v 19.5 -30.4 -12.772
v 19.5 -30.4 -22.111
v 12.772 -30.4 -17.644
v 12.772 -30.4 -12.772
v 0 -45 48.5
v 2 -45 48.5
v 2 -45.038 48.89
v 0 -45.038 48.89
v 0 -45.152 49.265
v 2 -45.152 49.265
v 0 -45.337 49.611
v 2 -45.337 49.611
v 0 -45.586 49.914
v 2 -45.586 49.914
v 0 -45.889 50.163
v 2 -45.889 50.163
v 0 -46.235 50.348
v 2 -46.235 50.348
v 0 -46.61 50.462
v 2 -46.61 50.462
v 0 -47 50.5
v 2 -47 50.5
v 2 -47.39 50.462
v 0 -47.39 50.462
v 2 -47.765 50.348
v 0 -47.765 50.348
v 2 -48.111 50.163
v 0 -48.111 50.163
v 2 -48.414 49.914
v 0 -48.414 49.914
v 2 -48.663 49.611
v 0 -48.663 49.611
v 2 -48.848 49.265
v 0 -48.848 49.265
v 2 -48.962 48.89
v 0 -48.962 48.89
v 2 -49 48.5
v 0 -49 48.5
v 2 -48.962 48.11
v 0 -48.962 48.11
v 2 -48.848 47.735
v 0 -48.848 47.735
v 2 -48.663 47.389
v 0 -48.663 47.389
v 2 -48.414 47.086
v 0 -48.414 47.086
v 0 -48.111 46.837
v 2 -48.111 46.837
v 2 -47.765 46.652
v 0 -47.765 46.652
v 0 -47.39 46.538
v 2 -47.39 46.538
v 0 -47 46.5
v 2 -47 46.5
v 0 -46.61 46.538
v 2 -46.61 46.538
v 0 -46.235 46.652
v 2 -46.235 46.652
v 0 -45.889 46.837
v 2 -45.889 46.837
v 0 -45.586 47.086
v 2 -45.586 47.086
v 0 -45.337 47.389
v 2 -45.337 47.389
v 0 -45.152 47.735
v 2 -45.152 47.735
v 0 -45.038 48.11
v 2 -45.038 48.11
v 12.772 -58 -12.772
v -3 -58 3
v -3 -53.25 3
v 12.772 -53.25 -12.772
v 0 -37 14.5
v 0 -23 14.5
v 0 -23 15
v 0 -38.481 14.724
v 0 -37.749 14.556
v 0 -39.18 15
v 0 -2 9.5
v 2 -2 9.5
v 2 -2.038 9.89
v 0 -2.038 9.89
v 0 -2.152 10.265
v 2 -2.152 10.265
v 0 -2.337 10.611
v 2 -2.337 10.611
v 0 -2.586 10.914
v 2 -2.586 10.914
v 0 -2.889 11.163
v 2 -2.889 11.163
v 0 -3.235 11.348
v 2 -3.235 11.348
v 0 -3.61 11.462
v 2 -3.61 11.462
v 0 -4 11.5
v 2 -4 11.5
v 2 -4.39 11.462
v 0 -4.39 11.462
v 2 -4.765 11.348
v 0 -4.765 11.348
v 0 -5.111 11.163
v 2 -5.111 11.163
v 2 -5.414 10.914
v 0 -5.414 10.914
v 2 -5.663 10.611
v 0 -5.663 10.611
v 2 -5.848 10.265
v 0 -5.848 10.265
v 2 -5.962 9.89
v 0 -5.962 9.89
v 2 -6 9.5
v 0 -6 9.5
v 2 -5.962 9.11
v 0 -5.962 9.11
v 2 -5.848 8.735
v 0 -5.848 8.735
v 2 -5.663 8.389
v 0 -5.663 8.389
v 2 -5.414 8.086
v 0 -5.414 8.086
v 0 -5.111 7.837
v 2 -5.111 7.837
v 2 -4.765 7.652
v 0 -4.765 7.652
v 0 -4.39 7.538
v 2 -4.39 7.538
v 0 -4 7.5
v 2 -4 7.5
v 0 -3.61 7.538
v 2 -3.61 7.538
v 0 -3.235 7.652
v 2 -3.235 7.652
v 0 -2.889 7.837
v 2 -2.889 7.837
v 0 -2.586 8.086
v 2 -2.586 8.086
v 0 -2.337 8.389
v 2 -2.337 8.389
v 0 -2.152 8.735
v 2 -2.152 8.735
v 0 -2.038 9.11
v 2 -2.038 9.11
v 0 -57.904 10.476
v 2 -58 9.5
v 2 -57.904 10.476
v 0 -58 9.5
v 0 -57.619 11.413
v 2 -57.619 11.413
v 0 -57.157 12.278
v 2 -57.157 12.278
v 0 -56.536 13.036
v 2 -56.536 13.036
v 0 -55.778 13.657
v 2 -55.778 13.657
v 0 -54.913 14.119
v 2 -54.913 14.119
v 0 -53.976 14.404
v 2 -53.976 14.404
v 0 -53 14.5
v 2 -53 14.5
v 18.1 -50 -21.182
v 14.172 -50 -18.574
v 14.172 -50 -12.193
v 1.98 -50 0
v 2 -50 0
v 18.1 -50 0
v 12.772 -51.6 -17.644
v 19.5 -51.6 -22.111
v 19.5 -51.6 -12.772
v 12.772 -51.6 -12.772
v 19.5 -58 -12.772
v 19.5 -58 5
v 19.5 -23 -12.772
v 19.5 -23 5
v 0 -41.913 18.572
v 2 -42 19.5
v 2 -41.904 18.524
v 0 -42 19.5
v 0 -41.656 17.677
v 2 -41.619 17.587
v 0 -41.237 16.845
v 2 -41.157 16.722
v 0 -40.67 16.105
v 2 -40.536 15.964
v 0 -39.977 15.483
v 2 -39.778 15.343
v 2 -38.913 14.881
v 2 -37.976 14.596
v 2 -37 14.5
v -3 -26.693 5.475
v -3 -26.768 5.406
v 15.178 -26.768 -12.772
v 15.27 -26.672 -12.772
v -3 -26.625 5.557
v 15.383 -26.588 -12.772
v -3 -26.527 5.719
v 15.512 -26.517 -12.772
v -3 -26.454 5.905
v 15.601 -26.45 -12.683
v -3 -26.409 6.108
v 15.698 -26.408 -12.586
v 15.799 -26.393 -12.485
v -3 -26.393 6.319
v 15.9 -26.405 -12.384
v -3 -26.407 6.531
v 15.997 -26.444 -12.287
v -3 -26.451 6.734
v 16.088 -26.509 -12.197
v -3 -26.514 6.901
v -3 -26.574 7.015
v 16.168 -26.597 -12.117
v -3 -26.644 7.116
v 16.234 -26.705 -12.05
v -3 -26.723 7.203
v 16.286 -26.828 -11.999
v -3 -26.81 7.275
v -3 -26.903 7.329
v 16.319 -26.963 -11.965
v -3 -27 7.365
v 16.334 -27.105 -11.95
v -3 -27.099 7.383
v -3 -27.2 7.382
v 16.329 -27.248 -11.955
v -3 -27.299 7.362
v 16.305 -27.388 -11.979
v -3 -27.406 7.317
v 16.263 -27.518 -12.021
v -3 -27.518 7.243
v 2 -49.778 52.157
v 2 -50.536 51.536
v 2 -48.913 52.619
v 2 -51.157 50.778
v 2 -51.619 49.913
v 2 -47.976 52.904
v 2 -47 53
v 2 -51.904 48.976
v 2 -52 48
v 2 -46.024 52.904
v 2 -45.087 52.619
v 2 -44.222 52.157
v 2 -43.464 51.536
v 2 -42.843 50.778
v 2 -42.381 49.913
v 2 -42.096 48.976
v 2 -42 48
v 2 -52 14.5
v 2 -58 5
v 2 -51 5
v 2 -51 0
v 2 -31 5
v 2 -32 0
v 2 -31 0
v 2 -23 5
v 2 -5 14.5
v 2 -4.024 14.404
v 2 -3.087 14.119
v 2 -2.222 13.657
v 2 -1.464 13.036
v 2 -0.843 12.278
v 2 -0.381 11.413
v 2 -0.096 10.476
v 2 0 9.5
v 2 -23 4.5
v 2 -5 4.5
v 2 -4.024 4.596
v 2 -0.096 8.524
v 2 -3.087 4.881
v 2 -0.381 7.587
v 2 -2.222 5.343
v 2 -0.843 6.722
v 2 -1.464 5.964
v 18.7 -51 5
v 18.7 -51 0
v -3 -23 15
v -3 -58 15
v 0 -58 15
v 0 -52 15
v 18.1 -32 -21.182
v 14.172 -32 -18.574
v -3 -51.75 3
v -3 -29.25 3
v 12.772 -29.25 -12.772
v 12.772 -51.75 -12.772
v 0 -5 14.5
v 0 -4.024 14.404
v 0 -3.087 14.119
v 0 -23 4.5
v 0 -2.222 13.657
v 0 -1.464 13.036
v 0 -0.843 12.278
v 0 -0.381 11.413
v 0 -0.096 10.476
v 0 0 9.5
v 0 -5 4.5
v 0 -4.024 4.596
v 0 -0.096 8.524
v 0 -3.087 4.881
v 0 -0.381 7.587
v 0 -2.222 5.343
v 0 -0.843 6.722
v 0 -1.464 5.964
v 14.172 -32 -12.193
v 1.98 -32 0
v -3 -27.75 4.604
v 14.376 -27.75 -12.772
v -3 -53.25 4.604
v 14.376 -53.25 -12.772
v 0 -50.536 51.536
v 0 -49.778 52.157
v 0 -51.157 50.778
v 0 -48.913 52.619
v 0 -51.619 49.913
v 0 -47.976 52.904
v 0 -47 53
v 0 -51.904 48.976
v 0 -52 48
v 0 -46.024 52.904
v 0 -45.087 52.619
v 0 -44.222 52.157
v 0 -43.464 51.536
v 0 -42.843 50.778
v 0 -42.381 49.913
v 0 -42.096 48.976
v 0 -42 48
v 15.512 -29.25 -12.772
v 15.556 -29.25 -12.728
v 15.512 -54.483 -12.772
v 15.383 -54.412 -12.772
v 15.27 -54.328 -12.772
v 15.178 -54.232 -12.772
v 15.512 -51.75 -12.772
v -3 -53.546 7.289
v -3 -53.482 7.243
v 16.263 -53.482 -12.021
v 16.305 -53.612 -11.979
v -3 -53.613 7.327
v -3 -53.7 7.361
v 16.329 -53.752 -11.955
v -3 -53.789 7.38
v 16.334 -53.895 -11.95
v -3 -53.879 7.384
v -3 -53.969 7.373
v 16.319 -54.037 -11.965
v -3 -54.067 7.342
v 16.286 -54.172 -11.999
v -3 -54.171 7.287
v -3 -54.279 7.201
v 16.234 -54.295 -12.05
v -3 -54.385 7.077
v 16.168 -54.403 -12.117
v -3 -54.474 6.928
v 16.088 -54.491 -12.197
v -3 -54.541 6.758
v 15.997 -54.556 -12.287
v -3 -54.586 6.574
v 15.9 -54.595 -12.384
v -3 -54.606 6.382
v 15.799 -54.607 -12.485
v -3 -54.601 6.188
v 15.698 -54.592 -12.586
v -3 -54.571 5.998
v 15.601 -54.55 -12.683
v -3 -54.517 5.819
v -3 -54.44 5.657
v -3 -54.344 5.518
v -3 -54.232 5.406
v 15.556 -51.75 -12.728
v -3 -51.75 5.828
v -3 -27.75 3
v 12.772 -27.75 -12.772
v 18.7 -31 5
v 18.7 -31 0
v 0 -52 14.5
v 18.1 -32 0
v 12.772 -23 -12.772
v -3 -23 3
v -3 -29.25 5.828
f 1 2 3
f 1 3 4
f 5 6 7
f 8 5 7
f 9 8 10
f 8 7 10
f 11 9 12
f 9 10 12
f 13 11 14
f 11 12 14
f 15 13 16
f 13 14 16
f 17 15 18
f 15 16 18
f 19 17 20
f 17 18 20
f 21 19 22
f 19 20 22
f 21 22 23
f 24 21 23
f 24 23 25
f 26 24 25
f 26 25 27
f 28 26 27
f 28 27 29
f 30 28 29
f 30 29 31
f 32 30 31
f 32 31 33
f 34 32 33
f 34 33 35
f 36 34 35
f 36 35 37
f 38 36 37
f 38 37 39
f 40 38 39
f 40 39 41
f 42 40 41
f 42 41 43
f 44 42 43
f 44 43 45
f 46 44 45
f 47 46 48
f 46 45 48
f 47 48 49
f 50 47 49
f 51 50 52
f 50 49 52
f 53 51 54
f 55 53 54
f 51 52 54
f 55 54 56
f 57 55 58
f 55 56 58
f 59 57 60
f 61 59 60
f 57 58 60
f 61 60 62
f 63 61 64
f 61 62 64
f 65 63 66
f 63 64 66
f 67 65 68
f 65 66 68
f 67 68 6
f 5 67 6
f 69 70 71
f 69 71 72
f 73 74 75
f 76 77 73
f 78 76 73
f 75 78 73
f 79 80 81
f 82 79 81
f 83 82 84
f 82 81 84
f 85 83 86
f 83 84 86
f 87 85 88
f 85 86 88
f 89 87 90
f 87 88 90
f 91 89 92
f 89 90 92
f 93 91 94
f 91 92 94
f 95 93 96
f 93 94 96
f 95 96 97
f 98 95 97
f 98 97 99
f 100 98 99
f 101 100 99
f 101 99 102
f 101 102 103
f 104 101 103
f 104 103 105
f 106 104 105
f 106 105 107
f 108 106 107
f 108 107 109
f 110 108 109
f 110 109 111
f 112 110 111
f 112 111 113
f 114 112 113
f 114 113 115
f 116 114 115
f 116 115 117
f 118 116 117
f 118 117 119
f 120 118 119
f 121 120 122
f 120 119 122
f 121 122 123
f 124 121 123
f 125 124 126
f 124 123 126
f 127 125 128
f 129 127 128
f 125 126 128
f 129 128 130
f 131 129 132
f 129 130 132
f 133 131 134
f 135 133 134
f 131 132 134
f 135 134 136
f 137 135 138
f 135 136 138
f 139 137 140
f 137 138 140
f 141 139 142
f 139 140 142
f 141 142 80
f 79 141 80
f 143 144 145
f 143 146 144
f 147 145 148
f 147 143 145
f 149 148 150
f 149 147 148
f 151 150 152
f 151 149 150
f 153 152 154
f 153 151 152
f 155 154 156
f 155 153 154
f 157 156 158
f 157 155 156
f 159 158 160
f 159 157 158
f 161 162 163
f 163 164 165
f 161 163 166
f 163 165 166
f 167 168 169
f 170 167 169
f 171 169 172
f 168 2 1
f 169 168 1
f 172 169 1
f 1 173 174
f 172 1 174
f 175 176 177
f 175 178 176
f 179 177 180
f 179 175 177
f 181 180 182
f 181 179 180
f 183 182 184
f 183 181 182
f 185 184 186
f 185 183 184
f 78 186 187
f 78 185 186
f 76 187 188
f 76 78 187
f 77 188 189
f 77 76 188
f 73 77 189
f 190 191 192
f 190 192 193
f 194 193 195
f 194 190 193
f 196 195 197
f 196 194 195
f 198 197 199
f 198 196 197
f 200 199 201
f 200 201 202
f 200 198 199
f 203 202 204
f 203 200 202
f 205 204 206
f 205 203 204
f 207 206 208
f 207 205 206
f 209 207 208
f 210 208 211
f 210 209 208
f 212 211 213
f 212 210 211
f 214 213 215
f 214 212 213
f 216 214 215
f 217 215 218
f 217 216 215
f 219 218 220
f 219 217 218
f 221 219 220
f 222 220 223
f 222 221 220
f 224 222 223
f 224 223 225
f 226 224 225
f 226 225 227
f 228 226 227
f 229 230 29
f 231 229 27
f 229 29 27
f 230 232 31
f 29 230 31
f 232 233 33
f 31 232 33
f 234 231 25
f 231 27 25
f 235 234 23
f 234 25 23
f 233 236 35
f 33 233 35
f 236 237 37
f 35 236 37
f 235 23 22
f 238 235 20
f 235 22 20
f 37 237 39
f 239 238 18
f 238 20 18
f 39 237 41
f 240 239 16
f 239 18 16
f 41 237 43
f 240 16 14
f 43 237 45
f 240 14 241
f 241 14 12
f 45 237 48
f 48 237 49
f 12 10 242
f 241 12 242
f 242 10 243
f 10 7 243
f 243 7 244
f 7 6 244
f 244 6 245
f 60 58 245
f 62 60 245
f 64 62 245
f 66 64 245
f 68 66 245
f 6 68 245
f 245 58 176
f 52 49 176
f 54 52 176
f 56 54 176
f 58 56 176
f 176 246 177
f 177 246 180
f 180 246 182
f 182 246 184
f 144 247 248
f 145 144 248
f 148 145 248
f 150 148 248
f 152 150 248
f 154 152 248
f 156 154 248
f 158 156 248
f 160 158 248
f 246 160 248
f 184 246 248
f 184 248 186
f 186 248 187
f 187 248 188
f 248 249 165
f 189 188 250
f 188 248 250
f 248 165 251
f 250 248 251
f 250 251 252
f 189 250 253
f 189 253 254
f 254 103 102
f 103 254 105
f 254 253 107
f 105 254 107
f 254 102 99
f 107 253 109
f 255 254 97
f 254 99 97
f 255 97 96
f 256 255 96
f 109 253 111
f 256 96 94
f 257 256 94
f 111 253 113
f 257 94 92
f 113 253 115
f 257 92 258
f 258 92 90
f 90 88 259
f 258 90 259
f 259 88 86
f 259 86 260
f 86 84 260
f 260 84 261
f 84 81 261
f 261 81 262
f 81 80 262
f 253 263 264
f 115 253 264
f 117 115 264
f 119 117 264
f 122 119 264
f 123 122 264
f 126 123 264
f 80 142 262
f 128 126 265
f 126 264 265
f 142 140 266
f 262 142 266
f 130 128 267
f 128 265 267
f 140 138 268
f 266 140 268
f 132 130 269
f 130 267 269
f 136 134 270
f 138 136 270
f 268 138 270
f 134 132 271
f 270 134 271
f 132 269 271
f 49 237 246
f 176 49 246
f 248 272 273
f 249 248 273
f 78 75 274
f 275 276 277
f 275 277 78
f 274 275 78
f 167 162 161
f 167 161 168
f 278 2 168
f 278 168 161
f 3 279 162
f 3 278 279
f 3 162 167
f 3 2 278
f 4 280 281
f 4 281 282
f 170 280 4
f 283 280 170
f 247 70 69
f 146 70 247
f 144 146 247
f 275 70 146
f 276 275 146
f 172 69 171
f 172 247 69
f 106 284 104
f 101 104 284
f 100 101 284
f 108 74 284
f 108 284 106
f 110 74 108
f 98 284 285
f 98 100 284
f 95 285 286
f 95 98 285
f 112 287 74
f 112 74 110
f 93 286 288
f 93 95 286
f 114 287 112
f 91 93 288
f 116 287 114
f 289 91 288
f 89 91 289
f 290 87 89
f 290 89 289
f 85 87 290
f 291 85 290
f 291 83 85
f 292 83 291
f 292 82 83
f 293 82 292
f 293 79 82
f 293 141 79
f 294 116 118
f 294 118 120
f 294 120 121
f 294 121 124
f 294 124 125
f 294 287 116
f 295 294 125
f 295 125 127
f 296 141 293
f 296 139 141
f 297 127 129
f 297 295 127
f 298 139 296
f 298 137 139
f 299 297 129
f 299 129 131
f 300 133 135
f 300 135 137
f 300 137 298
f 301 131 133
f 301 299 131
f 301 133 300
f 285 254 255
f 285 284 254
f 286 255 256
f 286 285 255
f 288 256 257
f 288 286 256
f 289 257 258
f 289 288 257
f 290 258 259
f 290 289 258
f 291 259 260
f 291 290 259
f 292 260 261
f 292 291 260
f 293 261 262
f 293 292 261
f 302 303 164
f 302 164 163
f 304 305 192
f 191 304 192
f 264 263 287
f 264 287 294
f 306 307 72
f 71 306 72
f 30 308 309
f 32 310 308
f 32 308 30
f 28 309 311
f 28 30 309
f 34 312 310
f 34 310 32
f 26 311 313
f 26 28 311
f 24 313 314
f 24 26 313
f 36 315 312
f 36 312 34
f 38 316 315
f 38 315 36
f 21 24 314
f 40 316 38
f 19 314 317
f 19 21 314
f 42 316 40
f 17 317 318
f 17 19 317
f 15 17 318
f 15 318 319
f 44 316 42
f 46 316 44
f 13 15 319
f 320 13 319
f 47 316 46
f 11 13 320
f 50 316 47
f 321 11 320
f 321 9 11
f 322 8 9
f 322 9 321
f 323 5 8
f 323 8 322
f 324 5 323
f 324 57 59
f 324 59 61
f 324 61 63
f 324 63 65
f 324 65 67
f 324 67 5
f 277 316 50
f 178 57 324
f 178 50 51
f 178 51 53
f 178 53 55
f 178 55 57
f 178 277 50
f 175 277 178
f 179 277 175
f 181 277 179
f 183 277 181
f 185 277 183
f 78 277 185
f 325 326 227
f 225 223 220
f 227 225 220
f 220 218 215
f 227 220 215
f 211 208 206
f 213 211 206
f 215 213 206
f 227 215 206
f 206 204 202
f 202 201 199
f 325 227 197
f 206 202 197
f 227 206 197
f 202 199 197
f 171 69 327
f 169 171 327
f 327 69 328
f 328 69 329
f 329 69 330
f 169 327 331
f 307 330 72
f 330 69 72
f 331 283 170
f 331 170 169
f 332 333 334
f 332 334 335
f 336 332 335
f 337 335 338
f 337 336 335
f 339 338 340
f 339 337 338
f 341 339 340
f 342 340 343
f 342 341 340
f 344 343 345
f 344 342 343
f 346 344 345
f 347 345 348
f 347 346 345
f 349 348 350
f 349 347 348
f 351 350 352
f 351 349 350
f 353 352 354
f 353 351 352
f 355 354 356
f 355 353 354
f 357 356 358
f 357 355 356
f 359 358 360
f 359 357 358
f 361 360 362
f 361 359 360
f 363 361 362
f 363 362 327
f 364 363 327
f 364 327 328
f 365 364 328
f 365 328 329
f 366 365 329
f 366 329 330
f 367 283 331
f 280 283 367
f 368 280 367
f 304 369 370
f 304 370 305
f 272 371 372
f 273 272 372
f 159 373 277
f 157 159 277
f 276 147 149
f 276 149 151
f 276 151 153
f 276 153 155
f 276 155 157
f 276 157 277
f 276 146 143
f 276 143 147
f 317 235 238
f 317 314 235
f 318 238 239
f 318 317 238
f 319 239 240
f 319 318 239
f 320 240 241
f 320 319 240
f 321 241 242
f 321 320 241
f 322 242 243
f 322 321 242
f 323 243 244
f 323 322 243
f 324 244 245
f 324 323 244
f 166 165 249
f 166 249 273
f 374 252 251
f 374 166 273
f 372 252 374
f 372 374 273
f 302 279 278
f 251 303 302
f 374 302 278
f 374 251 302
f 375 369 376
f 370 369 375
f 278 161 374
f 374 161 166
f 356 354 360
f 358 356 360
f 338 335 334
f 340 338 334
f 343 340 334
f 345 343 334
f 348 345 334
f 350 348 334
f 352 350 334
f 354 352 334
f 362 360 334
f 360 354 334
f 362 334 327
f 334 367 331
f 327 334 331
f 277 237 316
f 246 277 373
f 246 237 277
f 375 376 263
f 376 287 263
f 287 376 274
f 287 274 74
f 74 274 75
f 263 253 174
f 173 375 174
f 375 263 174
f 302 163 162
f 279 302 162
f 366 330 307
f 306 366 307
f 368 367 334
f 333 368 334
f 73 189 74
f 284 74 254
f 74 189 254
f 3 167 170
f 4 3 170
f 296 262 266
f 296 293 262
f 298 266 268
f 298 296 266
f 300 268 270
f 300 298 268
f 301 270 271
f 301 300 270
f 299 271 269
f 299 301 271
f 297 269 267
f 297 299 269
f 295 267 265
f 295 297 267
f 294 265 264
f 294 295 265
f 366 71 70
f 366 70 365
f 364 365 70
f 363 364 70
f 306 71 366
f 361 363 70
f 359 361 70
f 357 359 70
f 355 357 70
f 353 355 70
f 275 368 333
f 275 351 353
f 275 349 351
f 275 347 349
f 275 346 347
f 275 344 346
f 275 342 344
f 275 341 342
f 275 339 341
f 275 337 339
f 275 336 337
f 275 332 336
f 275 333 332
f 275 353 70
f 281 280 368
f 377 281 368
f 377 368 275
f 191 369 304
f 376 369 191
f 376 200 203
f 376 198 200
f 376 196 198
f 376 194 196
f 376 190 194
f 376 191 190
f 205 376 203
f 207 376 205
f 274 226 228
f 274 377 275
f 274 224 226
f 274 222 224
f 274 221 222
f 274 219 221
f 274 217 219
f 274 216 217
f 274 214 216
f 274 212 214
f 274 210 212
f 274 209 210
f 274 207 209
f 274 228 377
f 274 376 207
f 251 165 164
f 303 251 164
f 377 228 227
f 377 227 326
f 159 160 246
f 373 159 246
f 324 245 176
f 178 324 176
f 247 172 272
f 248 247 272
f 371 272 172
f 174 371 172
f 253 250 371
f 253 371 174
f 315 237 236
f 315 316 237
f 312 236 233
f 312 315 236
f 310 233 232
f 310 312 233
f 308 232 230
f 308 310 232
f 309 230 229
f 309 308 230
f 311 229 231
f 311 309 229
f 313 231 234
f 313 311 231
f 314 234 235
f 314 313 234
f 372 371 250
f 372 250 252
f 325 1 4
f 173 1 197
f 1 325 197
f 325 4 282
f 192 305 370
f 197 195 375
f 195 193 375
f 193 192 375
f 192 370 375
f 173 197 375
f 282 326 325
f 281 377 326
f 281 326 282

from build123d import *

# Parameters (mm, degrees)
SKETCH_1_W               = 2
SKETCH_1_H               = 58
EXTRUDE_1_DEPTH          = 53
SKETCH_4_W               = 5
SKETCH_4_H               = 35
EXTRUDE_3_DEPTH          = 19.5
CUT_EXTRUDE_START        = -0.8
SKETCH_9_W               = 5
SKETCH_9_H               = 20
CUT_EXTRUDE_5_DEPTH      = 16.7
SKETCH_10_R              = 2
CUT_EXTRUDE_6_DEPTH      = 10
SKETCH_11_W              = 38.5
SKETCH_11_H              = 6
SKETCH_11_H_2            = 42
SKETCH_11_W_2            = 4.5
SKETCH_11_H_3            = 23
CUT_EXTRUDE_7_DEPTH      = 10
FILLET_1_R               = 5
EXTRUDE_4_DEPTH          = 35
EXTRUDE_5_DEPTH          = 35
CUT_EXTRUDE_START_2      = 5
SKETCH_14_W              = 17.67500243
SKETCH_14_H              = 173.36044852
CUT_EXTRUDE_9_DEPTH      = 12
CUT_EXTRUDE_START_3      = 19
CUT_EXTRUDE_10_DEPTH     = 18
SKETCH_16_W              = 19.32347426
SKETCH_16_H              = 7.4
SKETCH_16_W_2            = 22.441906264
SKETCH_16_H_2            = 6.4
CUT_EXTRUDE_11_DEPTH     = 10
CUT_EXTRUDE_8_DEPTH      = 20
CUT_EXTRUDE_8_DEPTH_BACK = 43


with BuildPart() as part:
    # Эскиз1 → Бобышка-Вытянуть1 (new body)
    with BuildSketch(Plane.XY):
        with Locations((1, -29)):
            Rectangle(SKETCH_1_W, SKETCH_1_H)
    extrude(amount=EXTRUDE_1_DEPTH)

    # Эскиз4 → Бобышка-Вытянуть3 (add)
    with BuildSketch(Plane.ZY):
        with Locations((2.5, -40.5)):
            Rectangle(SKETCH_4_W, SKETCH_4_H)
    extrude(amount=-EXTRUDE_3_DEPTH)

    # Эскиз9 → Вырез-Вытянуть5 (cut)
    with BuildSketch(Plane(origin=(19.5, 0, 0), x_dir=(0, 0, -1), z_dir=(1, 0, 0)).offset(CUT_EXTRUDE_START)):
        with Locations((-2.5, -41)):
            Rectangle(SKETCH_9_W, SKETCH_9_H)
    extrude(amount=-CUT_EXTRUDE_5_DEPTH, mode=Mode.SUBTRACT)

    # Эскиз10 → Вырез-Вытянуть6 (cut)
    with BuildSketch(Plane(origin=(2, 0, 0), x_dir=(0, 0, -1), z_dir=(1, 0, 0))):
        with Locations(Location((-48.5, -47, 0), (0, 0, 90))):
            Circle(SKETCH_10_R)
        with Locations(Location((-9.5, -4, 0), (0, 0, 90))):
            Circle(SKETCH_10_R)
    extrude(amount=-CUT_EXTRUDE_6_DEPTH, mode=Mode.SUBTRACT)

    # Эскиз11 → Вырез-Вытянуть7 (cut)
    with BuildSketch(Plane(origin=(2, 0, 0), x_dir=(0, 0, -1), z_dir=(1, 0, 0))):
        with Locations((-33.75, -55)):
            Rectangle(SKETCH_11_W, SKETCH_11_H)
        with Locations((-33.75, -21)):
            Rectangle(SKETCH_11_W, SKETCH_11_H_2)
        with Locations((-2.25, -11.5)):
            Rectangle(SKETCH_11_W_2, SKETCH_11_H_3)
    extrude(amount=-CUT_EXTRUDE_7_DEPTH, mode=Mode.SUBTRACT)

    # Скругление1
    fillet_1_edges = [part.edges().sort_by_distance(p)[0] for p in [
        (1, -42, 14.5),
        (1, 0, 4.5),
        (1, 0, 14.5),
        (1, -58, 14.5),
        (1, -42, 53),
        (1, -52, 53),
    ]]
    fillet(fillet_1_edges, radius=FILLET_1_R - 0.0001)  # a hair under: the kernel refuses the full size

    # Эскиз12 → Бобышка-Вытянуть4 (add)
    with BuildSketch(Plane.XZ.offset(58)):
        Polygon((0, 0), (0, 15), (-15, 15), align=None)
    extrude(amount=-EXTRUDE_4_DEPTH)

    # Эскиз13 → Бобышка-Вытянуть5 (add)
    with BuildSketch(Plane(origin=(0, -23, 0), x_dir=(1, 0, 0), z_dir=(0, 1, 0))):
        Polygon((0, 0), (19.5, 0), (19.5, 22.111293257), (12.772431149, 17.644276295), (12.772431149, 12.772431149), align=None)
    extrude(amount=-EXTRUDE_5_DEPTH)

    # Эскиз14 → Вырез-Вытянуть9 (cut)
    with BuildSketch(Plane.ZY.offset(-2).offset(CUT_EXTRUDE_START_2)):
        with Locations((6.192960349, -52.7238676)):
            Rectangle(SKETCH_14_W, SKETCH_14_H)
    extrude(amount=CUT_EXTRUDE_9_DEPTH, mode=Mode.SUBTRACT)

    # Эскиз15 → Вырез-Вытянуть10 (cut)
    with BuildSketch(Plane.XZ.offset(31).offset(CUT_EXTRUDE_START_3)):
        Polygon((18.1, 0), (14.172431149, 0), (14.172431149, -12.192532161), (14.172431149, -24.03140998), (18.1, -24.03140998), align=None)
        Polygon((14.172431149, -12.192532161), (14.172431149, 0), (2, 0), (1.979898987, 0), align=None)
    extrude(amount=-CUT_EXTRUDE_10_DEPTH, mode=Mode.SUBTRACT)

    # Эскиз16 → Вырез-Вытянуть11 (cut)
    with BuildSketch(Plane.ZY.offset(-12.772431149)):
        with Locations((-22.434168279, -26.7)):
            Rectangle(SKETCH_16_W, SKETCH_16_H)
        with Locations((-23.993384281, -54.8)):
            Rectangle(SKETCH_16_W_2, SKETCH_16_H_2)
    extrude(amount=-CUT_EXTRUDE_11_DEPTH, mode=Mode.SUBTRACT)

    # Эскиз8 → Вырез-Вытянуть8 (cut, two sides: drawn at the far end of the back side and taken through both)
    with BuildSketch(Plane(origin=(0, 0, 0), x_dir=(-0.7071067811865437, 0, -0.7071067811865515), z_dir=(0.7071067811865515, 0, -0.7071067811865437)).offset(-CUT_EXTRUDE_8_DEPTH_BACK)):
        with BuildLine():
            Line((-2, -29.25), (0, -29.25))
            Line((0, -29.25), (0, -27.75))
            Line((0, -27.75), (-1.133974596, -27.75))
            Line((-1.133974596, -27.75), (-1.700961894, -26.767949192))
            ThreePointArc((-1.700961894, -26.767949192), (-1.626036577, -26.948834909), (-1.600480947, -27.142949192))
            ThreePointArc((-1.600480947, -27.142949192), (-2.156366663, -27.867393562), (-3, -27.517949192))
            Line((-3, -27.517949192), (-2, -29.25))
        make_face()
        with BuildLine():
            ThreePointArc((-1.700961894, -26.767949192), (-2.725480947, -26.49343014), (-3, -27.517949192))
            Line((-3, -27.517949192), (-1.700961894, -26.767949192))
        make_face()
        with BuildLine():
            Line((-1.700961894, -26.767949192), (-3, -27.517949192))
            ThreePointArc((-3, -27.517949192), (-2.156366663, -27.867393562), (-1.600480947, -27.142949192))
            ThreePointArc((-1.600480947, -27.142949192), (-1.626036577, -26.948834909), (-1.700961894, -26.767949192))
        make_face()
        with BuildLine():
            ThreePointArc((-3, -53.482050808), (-2.725480947, -54.50656986), (-1.700961894, -54.232050808))
            Line((-1.700961894, -54.232050808), (-3, -53.482050808))
        make_face()
        with BuildLine():
            Line((-3, -53.482050808), (-1.700961894, -54.232050808))
            ThreePointArc((-1.700961894, -54.232050808), (-1.626036577, -54.051165091), (-1.600480947, -53.857050808))
            ThreePointArc((-1.600480947, -53.857050808), (-2.156366663, -53.132606438), (-3, -53.482050808))
        make_face()
        with BuildLine():
            Line((-1.133974596, -53.25), (0, -53.25))
            Line((0, -53.25), (0, -51.75))
            Line((0, -51.75), (-2, -51.75))
            Line((-2, -51.75), (-3, -53.482050808))
            ThreePointArc((-3, -53.482050808), (-2.156366663, -53.132606438), (-1.600480947, -53.857050808))
            ThreePointArc((-1.600480947, -53.857050808), (-1.626036577, -54.051165091), (-1.700961894, -54.232050808))
            Line((-1.700961894, -54.232050808), (-1.133974596, -53.25))
        make_face()
    extrude(amount=CUT_EXTRUDE_8_DEPTH + CUT_EXTRUDE_8_DEPTH_BACK, mode=Mode.SUBTRACT)


solid = part.part
